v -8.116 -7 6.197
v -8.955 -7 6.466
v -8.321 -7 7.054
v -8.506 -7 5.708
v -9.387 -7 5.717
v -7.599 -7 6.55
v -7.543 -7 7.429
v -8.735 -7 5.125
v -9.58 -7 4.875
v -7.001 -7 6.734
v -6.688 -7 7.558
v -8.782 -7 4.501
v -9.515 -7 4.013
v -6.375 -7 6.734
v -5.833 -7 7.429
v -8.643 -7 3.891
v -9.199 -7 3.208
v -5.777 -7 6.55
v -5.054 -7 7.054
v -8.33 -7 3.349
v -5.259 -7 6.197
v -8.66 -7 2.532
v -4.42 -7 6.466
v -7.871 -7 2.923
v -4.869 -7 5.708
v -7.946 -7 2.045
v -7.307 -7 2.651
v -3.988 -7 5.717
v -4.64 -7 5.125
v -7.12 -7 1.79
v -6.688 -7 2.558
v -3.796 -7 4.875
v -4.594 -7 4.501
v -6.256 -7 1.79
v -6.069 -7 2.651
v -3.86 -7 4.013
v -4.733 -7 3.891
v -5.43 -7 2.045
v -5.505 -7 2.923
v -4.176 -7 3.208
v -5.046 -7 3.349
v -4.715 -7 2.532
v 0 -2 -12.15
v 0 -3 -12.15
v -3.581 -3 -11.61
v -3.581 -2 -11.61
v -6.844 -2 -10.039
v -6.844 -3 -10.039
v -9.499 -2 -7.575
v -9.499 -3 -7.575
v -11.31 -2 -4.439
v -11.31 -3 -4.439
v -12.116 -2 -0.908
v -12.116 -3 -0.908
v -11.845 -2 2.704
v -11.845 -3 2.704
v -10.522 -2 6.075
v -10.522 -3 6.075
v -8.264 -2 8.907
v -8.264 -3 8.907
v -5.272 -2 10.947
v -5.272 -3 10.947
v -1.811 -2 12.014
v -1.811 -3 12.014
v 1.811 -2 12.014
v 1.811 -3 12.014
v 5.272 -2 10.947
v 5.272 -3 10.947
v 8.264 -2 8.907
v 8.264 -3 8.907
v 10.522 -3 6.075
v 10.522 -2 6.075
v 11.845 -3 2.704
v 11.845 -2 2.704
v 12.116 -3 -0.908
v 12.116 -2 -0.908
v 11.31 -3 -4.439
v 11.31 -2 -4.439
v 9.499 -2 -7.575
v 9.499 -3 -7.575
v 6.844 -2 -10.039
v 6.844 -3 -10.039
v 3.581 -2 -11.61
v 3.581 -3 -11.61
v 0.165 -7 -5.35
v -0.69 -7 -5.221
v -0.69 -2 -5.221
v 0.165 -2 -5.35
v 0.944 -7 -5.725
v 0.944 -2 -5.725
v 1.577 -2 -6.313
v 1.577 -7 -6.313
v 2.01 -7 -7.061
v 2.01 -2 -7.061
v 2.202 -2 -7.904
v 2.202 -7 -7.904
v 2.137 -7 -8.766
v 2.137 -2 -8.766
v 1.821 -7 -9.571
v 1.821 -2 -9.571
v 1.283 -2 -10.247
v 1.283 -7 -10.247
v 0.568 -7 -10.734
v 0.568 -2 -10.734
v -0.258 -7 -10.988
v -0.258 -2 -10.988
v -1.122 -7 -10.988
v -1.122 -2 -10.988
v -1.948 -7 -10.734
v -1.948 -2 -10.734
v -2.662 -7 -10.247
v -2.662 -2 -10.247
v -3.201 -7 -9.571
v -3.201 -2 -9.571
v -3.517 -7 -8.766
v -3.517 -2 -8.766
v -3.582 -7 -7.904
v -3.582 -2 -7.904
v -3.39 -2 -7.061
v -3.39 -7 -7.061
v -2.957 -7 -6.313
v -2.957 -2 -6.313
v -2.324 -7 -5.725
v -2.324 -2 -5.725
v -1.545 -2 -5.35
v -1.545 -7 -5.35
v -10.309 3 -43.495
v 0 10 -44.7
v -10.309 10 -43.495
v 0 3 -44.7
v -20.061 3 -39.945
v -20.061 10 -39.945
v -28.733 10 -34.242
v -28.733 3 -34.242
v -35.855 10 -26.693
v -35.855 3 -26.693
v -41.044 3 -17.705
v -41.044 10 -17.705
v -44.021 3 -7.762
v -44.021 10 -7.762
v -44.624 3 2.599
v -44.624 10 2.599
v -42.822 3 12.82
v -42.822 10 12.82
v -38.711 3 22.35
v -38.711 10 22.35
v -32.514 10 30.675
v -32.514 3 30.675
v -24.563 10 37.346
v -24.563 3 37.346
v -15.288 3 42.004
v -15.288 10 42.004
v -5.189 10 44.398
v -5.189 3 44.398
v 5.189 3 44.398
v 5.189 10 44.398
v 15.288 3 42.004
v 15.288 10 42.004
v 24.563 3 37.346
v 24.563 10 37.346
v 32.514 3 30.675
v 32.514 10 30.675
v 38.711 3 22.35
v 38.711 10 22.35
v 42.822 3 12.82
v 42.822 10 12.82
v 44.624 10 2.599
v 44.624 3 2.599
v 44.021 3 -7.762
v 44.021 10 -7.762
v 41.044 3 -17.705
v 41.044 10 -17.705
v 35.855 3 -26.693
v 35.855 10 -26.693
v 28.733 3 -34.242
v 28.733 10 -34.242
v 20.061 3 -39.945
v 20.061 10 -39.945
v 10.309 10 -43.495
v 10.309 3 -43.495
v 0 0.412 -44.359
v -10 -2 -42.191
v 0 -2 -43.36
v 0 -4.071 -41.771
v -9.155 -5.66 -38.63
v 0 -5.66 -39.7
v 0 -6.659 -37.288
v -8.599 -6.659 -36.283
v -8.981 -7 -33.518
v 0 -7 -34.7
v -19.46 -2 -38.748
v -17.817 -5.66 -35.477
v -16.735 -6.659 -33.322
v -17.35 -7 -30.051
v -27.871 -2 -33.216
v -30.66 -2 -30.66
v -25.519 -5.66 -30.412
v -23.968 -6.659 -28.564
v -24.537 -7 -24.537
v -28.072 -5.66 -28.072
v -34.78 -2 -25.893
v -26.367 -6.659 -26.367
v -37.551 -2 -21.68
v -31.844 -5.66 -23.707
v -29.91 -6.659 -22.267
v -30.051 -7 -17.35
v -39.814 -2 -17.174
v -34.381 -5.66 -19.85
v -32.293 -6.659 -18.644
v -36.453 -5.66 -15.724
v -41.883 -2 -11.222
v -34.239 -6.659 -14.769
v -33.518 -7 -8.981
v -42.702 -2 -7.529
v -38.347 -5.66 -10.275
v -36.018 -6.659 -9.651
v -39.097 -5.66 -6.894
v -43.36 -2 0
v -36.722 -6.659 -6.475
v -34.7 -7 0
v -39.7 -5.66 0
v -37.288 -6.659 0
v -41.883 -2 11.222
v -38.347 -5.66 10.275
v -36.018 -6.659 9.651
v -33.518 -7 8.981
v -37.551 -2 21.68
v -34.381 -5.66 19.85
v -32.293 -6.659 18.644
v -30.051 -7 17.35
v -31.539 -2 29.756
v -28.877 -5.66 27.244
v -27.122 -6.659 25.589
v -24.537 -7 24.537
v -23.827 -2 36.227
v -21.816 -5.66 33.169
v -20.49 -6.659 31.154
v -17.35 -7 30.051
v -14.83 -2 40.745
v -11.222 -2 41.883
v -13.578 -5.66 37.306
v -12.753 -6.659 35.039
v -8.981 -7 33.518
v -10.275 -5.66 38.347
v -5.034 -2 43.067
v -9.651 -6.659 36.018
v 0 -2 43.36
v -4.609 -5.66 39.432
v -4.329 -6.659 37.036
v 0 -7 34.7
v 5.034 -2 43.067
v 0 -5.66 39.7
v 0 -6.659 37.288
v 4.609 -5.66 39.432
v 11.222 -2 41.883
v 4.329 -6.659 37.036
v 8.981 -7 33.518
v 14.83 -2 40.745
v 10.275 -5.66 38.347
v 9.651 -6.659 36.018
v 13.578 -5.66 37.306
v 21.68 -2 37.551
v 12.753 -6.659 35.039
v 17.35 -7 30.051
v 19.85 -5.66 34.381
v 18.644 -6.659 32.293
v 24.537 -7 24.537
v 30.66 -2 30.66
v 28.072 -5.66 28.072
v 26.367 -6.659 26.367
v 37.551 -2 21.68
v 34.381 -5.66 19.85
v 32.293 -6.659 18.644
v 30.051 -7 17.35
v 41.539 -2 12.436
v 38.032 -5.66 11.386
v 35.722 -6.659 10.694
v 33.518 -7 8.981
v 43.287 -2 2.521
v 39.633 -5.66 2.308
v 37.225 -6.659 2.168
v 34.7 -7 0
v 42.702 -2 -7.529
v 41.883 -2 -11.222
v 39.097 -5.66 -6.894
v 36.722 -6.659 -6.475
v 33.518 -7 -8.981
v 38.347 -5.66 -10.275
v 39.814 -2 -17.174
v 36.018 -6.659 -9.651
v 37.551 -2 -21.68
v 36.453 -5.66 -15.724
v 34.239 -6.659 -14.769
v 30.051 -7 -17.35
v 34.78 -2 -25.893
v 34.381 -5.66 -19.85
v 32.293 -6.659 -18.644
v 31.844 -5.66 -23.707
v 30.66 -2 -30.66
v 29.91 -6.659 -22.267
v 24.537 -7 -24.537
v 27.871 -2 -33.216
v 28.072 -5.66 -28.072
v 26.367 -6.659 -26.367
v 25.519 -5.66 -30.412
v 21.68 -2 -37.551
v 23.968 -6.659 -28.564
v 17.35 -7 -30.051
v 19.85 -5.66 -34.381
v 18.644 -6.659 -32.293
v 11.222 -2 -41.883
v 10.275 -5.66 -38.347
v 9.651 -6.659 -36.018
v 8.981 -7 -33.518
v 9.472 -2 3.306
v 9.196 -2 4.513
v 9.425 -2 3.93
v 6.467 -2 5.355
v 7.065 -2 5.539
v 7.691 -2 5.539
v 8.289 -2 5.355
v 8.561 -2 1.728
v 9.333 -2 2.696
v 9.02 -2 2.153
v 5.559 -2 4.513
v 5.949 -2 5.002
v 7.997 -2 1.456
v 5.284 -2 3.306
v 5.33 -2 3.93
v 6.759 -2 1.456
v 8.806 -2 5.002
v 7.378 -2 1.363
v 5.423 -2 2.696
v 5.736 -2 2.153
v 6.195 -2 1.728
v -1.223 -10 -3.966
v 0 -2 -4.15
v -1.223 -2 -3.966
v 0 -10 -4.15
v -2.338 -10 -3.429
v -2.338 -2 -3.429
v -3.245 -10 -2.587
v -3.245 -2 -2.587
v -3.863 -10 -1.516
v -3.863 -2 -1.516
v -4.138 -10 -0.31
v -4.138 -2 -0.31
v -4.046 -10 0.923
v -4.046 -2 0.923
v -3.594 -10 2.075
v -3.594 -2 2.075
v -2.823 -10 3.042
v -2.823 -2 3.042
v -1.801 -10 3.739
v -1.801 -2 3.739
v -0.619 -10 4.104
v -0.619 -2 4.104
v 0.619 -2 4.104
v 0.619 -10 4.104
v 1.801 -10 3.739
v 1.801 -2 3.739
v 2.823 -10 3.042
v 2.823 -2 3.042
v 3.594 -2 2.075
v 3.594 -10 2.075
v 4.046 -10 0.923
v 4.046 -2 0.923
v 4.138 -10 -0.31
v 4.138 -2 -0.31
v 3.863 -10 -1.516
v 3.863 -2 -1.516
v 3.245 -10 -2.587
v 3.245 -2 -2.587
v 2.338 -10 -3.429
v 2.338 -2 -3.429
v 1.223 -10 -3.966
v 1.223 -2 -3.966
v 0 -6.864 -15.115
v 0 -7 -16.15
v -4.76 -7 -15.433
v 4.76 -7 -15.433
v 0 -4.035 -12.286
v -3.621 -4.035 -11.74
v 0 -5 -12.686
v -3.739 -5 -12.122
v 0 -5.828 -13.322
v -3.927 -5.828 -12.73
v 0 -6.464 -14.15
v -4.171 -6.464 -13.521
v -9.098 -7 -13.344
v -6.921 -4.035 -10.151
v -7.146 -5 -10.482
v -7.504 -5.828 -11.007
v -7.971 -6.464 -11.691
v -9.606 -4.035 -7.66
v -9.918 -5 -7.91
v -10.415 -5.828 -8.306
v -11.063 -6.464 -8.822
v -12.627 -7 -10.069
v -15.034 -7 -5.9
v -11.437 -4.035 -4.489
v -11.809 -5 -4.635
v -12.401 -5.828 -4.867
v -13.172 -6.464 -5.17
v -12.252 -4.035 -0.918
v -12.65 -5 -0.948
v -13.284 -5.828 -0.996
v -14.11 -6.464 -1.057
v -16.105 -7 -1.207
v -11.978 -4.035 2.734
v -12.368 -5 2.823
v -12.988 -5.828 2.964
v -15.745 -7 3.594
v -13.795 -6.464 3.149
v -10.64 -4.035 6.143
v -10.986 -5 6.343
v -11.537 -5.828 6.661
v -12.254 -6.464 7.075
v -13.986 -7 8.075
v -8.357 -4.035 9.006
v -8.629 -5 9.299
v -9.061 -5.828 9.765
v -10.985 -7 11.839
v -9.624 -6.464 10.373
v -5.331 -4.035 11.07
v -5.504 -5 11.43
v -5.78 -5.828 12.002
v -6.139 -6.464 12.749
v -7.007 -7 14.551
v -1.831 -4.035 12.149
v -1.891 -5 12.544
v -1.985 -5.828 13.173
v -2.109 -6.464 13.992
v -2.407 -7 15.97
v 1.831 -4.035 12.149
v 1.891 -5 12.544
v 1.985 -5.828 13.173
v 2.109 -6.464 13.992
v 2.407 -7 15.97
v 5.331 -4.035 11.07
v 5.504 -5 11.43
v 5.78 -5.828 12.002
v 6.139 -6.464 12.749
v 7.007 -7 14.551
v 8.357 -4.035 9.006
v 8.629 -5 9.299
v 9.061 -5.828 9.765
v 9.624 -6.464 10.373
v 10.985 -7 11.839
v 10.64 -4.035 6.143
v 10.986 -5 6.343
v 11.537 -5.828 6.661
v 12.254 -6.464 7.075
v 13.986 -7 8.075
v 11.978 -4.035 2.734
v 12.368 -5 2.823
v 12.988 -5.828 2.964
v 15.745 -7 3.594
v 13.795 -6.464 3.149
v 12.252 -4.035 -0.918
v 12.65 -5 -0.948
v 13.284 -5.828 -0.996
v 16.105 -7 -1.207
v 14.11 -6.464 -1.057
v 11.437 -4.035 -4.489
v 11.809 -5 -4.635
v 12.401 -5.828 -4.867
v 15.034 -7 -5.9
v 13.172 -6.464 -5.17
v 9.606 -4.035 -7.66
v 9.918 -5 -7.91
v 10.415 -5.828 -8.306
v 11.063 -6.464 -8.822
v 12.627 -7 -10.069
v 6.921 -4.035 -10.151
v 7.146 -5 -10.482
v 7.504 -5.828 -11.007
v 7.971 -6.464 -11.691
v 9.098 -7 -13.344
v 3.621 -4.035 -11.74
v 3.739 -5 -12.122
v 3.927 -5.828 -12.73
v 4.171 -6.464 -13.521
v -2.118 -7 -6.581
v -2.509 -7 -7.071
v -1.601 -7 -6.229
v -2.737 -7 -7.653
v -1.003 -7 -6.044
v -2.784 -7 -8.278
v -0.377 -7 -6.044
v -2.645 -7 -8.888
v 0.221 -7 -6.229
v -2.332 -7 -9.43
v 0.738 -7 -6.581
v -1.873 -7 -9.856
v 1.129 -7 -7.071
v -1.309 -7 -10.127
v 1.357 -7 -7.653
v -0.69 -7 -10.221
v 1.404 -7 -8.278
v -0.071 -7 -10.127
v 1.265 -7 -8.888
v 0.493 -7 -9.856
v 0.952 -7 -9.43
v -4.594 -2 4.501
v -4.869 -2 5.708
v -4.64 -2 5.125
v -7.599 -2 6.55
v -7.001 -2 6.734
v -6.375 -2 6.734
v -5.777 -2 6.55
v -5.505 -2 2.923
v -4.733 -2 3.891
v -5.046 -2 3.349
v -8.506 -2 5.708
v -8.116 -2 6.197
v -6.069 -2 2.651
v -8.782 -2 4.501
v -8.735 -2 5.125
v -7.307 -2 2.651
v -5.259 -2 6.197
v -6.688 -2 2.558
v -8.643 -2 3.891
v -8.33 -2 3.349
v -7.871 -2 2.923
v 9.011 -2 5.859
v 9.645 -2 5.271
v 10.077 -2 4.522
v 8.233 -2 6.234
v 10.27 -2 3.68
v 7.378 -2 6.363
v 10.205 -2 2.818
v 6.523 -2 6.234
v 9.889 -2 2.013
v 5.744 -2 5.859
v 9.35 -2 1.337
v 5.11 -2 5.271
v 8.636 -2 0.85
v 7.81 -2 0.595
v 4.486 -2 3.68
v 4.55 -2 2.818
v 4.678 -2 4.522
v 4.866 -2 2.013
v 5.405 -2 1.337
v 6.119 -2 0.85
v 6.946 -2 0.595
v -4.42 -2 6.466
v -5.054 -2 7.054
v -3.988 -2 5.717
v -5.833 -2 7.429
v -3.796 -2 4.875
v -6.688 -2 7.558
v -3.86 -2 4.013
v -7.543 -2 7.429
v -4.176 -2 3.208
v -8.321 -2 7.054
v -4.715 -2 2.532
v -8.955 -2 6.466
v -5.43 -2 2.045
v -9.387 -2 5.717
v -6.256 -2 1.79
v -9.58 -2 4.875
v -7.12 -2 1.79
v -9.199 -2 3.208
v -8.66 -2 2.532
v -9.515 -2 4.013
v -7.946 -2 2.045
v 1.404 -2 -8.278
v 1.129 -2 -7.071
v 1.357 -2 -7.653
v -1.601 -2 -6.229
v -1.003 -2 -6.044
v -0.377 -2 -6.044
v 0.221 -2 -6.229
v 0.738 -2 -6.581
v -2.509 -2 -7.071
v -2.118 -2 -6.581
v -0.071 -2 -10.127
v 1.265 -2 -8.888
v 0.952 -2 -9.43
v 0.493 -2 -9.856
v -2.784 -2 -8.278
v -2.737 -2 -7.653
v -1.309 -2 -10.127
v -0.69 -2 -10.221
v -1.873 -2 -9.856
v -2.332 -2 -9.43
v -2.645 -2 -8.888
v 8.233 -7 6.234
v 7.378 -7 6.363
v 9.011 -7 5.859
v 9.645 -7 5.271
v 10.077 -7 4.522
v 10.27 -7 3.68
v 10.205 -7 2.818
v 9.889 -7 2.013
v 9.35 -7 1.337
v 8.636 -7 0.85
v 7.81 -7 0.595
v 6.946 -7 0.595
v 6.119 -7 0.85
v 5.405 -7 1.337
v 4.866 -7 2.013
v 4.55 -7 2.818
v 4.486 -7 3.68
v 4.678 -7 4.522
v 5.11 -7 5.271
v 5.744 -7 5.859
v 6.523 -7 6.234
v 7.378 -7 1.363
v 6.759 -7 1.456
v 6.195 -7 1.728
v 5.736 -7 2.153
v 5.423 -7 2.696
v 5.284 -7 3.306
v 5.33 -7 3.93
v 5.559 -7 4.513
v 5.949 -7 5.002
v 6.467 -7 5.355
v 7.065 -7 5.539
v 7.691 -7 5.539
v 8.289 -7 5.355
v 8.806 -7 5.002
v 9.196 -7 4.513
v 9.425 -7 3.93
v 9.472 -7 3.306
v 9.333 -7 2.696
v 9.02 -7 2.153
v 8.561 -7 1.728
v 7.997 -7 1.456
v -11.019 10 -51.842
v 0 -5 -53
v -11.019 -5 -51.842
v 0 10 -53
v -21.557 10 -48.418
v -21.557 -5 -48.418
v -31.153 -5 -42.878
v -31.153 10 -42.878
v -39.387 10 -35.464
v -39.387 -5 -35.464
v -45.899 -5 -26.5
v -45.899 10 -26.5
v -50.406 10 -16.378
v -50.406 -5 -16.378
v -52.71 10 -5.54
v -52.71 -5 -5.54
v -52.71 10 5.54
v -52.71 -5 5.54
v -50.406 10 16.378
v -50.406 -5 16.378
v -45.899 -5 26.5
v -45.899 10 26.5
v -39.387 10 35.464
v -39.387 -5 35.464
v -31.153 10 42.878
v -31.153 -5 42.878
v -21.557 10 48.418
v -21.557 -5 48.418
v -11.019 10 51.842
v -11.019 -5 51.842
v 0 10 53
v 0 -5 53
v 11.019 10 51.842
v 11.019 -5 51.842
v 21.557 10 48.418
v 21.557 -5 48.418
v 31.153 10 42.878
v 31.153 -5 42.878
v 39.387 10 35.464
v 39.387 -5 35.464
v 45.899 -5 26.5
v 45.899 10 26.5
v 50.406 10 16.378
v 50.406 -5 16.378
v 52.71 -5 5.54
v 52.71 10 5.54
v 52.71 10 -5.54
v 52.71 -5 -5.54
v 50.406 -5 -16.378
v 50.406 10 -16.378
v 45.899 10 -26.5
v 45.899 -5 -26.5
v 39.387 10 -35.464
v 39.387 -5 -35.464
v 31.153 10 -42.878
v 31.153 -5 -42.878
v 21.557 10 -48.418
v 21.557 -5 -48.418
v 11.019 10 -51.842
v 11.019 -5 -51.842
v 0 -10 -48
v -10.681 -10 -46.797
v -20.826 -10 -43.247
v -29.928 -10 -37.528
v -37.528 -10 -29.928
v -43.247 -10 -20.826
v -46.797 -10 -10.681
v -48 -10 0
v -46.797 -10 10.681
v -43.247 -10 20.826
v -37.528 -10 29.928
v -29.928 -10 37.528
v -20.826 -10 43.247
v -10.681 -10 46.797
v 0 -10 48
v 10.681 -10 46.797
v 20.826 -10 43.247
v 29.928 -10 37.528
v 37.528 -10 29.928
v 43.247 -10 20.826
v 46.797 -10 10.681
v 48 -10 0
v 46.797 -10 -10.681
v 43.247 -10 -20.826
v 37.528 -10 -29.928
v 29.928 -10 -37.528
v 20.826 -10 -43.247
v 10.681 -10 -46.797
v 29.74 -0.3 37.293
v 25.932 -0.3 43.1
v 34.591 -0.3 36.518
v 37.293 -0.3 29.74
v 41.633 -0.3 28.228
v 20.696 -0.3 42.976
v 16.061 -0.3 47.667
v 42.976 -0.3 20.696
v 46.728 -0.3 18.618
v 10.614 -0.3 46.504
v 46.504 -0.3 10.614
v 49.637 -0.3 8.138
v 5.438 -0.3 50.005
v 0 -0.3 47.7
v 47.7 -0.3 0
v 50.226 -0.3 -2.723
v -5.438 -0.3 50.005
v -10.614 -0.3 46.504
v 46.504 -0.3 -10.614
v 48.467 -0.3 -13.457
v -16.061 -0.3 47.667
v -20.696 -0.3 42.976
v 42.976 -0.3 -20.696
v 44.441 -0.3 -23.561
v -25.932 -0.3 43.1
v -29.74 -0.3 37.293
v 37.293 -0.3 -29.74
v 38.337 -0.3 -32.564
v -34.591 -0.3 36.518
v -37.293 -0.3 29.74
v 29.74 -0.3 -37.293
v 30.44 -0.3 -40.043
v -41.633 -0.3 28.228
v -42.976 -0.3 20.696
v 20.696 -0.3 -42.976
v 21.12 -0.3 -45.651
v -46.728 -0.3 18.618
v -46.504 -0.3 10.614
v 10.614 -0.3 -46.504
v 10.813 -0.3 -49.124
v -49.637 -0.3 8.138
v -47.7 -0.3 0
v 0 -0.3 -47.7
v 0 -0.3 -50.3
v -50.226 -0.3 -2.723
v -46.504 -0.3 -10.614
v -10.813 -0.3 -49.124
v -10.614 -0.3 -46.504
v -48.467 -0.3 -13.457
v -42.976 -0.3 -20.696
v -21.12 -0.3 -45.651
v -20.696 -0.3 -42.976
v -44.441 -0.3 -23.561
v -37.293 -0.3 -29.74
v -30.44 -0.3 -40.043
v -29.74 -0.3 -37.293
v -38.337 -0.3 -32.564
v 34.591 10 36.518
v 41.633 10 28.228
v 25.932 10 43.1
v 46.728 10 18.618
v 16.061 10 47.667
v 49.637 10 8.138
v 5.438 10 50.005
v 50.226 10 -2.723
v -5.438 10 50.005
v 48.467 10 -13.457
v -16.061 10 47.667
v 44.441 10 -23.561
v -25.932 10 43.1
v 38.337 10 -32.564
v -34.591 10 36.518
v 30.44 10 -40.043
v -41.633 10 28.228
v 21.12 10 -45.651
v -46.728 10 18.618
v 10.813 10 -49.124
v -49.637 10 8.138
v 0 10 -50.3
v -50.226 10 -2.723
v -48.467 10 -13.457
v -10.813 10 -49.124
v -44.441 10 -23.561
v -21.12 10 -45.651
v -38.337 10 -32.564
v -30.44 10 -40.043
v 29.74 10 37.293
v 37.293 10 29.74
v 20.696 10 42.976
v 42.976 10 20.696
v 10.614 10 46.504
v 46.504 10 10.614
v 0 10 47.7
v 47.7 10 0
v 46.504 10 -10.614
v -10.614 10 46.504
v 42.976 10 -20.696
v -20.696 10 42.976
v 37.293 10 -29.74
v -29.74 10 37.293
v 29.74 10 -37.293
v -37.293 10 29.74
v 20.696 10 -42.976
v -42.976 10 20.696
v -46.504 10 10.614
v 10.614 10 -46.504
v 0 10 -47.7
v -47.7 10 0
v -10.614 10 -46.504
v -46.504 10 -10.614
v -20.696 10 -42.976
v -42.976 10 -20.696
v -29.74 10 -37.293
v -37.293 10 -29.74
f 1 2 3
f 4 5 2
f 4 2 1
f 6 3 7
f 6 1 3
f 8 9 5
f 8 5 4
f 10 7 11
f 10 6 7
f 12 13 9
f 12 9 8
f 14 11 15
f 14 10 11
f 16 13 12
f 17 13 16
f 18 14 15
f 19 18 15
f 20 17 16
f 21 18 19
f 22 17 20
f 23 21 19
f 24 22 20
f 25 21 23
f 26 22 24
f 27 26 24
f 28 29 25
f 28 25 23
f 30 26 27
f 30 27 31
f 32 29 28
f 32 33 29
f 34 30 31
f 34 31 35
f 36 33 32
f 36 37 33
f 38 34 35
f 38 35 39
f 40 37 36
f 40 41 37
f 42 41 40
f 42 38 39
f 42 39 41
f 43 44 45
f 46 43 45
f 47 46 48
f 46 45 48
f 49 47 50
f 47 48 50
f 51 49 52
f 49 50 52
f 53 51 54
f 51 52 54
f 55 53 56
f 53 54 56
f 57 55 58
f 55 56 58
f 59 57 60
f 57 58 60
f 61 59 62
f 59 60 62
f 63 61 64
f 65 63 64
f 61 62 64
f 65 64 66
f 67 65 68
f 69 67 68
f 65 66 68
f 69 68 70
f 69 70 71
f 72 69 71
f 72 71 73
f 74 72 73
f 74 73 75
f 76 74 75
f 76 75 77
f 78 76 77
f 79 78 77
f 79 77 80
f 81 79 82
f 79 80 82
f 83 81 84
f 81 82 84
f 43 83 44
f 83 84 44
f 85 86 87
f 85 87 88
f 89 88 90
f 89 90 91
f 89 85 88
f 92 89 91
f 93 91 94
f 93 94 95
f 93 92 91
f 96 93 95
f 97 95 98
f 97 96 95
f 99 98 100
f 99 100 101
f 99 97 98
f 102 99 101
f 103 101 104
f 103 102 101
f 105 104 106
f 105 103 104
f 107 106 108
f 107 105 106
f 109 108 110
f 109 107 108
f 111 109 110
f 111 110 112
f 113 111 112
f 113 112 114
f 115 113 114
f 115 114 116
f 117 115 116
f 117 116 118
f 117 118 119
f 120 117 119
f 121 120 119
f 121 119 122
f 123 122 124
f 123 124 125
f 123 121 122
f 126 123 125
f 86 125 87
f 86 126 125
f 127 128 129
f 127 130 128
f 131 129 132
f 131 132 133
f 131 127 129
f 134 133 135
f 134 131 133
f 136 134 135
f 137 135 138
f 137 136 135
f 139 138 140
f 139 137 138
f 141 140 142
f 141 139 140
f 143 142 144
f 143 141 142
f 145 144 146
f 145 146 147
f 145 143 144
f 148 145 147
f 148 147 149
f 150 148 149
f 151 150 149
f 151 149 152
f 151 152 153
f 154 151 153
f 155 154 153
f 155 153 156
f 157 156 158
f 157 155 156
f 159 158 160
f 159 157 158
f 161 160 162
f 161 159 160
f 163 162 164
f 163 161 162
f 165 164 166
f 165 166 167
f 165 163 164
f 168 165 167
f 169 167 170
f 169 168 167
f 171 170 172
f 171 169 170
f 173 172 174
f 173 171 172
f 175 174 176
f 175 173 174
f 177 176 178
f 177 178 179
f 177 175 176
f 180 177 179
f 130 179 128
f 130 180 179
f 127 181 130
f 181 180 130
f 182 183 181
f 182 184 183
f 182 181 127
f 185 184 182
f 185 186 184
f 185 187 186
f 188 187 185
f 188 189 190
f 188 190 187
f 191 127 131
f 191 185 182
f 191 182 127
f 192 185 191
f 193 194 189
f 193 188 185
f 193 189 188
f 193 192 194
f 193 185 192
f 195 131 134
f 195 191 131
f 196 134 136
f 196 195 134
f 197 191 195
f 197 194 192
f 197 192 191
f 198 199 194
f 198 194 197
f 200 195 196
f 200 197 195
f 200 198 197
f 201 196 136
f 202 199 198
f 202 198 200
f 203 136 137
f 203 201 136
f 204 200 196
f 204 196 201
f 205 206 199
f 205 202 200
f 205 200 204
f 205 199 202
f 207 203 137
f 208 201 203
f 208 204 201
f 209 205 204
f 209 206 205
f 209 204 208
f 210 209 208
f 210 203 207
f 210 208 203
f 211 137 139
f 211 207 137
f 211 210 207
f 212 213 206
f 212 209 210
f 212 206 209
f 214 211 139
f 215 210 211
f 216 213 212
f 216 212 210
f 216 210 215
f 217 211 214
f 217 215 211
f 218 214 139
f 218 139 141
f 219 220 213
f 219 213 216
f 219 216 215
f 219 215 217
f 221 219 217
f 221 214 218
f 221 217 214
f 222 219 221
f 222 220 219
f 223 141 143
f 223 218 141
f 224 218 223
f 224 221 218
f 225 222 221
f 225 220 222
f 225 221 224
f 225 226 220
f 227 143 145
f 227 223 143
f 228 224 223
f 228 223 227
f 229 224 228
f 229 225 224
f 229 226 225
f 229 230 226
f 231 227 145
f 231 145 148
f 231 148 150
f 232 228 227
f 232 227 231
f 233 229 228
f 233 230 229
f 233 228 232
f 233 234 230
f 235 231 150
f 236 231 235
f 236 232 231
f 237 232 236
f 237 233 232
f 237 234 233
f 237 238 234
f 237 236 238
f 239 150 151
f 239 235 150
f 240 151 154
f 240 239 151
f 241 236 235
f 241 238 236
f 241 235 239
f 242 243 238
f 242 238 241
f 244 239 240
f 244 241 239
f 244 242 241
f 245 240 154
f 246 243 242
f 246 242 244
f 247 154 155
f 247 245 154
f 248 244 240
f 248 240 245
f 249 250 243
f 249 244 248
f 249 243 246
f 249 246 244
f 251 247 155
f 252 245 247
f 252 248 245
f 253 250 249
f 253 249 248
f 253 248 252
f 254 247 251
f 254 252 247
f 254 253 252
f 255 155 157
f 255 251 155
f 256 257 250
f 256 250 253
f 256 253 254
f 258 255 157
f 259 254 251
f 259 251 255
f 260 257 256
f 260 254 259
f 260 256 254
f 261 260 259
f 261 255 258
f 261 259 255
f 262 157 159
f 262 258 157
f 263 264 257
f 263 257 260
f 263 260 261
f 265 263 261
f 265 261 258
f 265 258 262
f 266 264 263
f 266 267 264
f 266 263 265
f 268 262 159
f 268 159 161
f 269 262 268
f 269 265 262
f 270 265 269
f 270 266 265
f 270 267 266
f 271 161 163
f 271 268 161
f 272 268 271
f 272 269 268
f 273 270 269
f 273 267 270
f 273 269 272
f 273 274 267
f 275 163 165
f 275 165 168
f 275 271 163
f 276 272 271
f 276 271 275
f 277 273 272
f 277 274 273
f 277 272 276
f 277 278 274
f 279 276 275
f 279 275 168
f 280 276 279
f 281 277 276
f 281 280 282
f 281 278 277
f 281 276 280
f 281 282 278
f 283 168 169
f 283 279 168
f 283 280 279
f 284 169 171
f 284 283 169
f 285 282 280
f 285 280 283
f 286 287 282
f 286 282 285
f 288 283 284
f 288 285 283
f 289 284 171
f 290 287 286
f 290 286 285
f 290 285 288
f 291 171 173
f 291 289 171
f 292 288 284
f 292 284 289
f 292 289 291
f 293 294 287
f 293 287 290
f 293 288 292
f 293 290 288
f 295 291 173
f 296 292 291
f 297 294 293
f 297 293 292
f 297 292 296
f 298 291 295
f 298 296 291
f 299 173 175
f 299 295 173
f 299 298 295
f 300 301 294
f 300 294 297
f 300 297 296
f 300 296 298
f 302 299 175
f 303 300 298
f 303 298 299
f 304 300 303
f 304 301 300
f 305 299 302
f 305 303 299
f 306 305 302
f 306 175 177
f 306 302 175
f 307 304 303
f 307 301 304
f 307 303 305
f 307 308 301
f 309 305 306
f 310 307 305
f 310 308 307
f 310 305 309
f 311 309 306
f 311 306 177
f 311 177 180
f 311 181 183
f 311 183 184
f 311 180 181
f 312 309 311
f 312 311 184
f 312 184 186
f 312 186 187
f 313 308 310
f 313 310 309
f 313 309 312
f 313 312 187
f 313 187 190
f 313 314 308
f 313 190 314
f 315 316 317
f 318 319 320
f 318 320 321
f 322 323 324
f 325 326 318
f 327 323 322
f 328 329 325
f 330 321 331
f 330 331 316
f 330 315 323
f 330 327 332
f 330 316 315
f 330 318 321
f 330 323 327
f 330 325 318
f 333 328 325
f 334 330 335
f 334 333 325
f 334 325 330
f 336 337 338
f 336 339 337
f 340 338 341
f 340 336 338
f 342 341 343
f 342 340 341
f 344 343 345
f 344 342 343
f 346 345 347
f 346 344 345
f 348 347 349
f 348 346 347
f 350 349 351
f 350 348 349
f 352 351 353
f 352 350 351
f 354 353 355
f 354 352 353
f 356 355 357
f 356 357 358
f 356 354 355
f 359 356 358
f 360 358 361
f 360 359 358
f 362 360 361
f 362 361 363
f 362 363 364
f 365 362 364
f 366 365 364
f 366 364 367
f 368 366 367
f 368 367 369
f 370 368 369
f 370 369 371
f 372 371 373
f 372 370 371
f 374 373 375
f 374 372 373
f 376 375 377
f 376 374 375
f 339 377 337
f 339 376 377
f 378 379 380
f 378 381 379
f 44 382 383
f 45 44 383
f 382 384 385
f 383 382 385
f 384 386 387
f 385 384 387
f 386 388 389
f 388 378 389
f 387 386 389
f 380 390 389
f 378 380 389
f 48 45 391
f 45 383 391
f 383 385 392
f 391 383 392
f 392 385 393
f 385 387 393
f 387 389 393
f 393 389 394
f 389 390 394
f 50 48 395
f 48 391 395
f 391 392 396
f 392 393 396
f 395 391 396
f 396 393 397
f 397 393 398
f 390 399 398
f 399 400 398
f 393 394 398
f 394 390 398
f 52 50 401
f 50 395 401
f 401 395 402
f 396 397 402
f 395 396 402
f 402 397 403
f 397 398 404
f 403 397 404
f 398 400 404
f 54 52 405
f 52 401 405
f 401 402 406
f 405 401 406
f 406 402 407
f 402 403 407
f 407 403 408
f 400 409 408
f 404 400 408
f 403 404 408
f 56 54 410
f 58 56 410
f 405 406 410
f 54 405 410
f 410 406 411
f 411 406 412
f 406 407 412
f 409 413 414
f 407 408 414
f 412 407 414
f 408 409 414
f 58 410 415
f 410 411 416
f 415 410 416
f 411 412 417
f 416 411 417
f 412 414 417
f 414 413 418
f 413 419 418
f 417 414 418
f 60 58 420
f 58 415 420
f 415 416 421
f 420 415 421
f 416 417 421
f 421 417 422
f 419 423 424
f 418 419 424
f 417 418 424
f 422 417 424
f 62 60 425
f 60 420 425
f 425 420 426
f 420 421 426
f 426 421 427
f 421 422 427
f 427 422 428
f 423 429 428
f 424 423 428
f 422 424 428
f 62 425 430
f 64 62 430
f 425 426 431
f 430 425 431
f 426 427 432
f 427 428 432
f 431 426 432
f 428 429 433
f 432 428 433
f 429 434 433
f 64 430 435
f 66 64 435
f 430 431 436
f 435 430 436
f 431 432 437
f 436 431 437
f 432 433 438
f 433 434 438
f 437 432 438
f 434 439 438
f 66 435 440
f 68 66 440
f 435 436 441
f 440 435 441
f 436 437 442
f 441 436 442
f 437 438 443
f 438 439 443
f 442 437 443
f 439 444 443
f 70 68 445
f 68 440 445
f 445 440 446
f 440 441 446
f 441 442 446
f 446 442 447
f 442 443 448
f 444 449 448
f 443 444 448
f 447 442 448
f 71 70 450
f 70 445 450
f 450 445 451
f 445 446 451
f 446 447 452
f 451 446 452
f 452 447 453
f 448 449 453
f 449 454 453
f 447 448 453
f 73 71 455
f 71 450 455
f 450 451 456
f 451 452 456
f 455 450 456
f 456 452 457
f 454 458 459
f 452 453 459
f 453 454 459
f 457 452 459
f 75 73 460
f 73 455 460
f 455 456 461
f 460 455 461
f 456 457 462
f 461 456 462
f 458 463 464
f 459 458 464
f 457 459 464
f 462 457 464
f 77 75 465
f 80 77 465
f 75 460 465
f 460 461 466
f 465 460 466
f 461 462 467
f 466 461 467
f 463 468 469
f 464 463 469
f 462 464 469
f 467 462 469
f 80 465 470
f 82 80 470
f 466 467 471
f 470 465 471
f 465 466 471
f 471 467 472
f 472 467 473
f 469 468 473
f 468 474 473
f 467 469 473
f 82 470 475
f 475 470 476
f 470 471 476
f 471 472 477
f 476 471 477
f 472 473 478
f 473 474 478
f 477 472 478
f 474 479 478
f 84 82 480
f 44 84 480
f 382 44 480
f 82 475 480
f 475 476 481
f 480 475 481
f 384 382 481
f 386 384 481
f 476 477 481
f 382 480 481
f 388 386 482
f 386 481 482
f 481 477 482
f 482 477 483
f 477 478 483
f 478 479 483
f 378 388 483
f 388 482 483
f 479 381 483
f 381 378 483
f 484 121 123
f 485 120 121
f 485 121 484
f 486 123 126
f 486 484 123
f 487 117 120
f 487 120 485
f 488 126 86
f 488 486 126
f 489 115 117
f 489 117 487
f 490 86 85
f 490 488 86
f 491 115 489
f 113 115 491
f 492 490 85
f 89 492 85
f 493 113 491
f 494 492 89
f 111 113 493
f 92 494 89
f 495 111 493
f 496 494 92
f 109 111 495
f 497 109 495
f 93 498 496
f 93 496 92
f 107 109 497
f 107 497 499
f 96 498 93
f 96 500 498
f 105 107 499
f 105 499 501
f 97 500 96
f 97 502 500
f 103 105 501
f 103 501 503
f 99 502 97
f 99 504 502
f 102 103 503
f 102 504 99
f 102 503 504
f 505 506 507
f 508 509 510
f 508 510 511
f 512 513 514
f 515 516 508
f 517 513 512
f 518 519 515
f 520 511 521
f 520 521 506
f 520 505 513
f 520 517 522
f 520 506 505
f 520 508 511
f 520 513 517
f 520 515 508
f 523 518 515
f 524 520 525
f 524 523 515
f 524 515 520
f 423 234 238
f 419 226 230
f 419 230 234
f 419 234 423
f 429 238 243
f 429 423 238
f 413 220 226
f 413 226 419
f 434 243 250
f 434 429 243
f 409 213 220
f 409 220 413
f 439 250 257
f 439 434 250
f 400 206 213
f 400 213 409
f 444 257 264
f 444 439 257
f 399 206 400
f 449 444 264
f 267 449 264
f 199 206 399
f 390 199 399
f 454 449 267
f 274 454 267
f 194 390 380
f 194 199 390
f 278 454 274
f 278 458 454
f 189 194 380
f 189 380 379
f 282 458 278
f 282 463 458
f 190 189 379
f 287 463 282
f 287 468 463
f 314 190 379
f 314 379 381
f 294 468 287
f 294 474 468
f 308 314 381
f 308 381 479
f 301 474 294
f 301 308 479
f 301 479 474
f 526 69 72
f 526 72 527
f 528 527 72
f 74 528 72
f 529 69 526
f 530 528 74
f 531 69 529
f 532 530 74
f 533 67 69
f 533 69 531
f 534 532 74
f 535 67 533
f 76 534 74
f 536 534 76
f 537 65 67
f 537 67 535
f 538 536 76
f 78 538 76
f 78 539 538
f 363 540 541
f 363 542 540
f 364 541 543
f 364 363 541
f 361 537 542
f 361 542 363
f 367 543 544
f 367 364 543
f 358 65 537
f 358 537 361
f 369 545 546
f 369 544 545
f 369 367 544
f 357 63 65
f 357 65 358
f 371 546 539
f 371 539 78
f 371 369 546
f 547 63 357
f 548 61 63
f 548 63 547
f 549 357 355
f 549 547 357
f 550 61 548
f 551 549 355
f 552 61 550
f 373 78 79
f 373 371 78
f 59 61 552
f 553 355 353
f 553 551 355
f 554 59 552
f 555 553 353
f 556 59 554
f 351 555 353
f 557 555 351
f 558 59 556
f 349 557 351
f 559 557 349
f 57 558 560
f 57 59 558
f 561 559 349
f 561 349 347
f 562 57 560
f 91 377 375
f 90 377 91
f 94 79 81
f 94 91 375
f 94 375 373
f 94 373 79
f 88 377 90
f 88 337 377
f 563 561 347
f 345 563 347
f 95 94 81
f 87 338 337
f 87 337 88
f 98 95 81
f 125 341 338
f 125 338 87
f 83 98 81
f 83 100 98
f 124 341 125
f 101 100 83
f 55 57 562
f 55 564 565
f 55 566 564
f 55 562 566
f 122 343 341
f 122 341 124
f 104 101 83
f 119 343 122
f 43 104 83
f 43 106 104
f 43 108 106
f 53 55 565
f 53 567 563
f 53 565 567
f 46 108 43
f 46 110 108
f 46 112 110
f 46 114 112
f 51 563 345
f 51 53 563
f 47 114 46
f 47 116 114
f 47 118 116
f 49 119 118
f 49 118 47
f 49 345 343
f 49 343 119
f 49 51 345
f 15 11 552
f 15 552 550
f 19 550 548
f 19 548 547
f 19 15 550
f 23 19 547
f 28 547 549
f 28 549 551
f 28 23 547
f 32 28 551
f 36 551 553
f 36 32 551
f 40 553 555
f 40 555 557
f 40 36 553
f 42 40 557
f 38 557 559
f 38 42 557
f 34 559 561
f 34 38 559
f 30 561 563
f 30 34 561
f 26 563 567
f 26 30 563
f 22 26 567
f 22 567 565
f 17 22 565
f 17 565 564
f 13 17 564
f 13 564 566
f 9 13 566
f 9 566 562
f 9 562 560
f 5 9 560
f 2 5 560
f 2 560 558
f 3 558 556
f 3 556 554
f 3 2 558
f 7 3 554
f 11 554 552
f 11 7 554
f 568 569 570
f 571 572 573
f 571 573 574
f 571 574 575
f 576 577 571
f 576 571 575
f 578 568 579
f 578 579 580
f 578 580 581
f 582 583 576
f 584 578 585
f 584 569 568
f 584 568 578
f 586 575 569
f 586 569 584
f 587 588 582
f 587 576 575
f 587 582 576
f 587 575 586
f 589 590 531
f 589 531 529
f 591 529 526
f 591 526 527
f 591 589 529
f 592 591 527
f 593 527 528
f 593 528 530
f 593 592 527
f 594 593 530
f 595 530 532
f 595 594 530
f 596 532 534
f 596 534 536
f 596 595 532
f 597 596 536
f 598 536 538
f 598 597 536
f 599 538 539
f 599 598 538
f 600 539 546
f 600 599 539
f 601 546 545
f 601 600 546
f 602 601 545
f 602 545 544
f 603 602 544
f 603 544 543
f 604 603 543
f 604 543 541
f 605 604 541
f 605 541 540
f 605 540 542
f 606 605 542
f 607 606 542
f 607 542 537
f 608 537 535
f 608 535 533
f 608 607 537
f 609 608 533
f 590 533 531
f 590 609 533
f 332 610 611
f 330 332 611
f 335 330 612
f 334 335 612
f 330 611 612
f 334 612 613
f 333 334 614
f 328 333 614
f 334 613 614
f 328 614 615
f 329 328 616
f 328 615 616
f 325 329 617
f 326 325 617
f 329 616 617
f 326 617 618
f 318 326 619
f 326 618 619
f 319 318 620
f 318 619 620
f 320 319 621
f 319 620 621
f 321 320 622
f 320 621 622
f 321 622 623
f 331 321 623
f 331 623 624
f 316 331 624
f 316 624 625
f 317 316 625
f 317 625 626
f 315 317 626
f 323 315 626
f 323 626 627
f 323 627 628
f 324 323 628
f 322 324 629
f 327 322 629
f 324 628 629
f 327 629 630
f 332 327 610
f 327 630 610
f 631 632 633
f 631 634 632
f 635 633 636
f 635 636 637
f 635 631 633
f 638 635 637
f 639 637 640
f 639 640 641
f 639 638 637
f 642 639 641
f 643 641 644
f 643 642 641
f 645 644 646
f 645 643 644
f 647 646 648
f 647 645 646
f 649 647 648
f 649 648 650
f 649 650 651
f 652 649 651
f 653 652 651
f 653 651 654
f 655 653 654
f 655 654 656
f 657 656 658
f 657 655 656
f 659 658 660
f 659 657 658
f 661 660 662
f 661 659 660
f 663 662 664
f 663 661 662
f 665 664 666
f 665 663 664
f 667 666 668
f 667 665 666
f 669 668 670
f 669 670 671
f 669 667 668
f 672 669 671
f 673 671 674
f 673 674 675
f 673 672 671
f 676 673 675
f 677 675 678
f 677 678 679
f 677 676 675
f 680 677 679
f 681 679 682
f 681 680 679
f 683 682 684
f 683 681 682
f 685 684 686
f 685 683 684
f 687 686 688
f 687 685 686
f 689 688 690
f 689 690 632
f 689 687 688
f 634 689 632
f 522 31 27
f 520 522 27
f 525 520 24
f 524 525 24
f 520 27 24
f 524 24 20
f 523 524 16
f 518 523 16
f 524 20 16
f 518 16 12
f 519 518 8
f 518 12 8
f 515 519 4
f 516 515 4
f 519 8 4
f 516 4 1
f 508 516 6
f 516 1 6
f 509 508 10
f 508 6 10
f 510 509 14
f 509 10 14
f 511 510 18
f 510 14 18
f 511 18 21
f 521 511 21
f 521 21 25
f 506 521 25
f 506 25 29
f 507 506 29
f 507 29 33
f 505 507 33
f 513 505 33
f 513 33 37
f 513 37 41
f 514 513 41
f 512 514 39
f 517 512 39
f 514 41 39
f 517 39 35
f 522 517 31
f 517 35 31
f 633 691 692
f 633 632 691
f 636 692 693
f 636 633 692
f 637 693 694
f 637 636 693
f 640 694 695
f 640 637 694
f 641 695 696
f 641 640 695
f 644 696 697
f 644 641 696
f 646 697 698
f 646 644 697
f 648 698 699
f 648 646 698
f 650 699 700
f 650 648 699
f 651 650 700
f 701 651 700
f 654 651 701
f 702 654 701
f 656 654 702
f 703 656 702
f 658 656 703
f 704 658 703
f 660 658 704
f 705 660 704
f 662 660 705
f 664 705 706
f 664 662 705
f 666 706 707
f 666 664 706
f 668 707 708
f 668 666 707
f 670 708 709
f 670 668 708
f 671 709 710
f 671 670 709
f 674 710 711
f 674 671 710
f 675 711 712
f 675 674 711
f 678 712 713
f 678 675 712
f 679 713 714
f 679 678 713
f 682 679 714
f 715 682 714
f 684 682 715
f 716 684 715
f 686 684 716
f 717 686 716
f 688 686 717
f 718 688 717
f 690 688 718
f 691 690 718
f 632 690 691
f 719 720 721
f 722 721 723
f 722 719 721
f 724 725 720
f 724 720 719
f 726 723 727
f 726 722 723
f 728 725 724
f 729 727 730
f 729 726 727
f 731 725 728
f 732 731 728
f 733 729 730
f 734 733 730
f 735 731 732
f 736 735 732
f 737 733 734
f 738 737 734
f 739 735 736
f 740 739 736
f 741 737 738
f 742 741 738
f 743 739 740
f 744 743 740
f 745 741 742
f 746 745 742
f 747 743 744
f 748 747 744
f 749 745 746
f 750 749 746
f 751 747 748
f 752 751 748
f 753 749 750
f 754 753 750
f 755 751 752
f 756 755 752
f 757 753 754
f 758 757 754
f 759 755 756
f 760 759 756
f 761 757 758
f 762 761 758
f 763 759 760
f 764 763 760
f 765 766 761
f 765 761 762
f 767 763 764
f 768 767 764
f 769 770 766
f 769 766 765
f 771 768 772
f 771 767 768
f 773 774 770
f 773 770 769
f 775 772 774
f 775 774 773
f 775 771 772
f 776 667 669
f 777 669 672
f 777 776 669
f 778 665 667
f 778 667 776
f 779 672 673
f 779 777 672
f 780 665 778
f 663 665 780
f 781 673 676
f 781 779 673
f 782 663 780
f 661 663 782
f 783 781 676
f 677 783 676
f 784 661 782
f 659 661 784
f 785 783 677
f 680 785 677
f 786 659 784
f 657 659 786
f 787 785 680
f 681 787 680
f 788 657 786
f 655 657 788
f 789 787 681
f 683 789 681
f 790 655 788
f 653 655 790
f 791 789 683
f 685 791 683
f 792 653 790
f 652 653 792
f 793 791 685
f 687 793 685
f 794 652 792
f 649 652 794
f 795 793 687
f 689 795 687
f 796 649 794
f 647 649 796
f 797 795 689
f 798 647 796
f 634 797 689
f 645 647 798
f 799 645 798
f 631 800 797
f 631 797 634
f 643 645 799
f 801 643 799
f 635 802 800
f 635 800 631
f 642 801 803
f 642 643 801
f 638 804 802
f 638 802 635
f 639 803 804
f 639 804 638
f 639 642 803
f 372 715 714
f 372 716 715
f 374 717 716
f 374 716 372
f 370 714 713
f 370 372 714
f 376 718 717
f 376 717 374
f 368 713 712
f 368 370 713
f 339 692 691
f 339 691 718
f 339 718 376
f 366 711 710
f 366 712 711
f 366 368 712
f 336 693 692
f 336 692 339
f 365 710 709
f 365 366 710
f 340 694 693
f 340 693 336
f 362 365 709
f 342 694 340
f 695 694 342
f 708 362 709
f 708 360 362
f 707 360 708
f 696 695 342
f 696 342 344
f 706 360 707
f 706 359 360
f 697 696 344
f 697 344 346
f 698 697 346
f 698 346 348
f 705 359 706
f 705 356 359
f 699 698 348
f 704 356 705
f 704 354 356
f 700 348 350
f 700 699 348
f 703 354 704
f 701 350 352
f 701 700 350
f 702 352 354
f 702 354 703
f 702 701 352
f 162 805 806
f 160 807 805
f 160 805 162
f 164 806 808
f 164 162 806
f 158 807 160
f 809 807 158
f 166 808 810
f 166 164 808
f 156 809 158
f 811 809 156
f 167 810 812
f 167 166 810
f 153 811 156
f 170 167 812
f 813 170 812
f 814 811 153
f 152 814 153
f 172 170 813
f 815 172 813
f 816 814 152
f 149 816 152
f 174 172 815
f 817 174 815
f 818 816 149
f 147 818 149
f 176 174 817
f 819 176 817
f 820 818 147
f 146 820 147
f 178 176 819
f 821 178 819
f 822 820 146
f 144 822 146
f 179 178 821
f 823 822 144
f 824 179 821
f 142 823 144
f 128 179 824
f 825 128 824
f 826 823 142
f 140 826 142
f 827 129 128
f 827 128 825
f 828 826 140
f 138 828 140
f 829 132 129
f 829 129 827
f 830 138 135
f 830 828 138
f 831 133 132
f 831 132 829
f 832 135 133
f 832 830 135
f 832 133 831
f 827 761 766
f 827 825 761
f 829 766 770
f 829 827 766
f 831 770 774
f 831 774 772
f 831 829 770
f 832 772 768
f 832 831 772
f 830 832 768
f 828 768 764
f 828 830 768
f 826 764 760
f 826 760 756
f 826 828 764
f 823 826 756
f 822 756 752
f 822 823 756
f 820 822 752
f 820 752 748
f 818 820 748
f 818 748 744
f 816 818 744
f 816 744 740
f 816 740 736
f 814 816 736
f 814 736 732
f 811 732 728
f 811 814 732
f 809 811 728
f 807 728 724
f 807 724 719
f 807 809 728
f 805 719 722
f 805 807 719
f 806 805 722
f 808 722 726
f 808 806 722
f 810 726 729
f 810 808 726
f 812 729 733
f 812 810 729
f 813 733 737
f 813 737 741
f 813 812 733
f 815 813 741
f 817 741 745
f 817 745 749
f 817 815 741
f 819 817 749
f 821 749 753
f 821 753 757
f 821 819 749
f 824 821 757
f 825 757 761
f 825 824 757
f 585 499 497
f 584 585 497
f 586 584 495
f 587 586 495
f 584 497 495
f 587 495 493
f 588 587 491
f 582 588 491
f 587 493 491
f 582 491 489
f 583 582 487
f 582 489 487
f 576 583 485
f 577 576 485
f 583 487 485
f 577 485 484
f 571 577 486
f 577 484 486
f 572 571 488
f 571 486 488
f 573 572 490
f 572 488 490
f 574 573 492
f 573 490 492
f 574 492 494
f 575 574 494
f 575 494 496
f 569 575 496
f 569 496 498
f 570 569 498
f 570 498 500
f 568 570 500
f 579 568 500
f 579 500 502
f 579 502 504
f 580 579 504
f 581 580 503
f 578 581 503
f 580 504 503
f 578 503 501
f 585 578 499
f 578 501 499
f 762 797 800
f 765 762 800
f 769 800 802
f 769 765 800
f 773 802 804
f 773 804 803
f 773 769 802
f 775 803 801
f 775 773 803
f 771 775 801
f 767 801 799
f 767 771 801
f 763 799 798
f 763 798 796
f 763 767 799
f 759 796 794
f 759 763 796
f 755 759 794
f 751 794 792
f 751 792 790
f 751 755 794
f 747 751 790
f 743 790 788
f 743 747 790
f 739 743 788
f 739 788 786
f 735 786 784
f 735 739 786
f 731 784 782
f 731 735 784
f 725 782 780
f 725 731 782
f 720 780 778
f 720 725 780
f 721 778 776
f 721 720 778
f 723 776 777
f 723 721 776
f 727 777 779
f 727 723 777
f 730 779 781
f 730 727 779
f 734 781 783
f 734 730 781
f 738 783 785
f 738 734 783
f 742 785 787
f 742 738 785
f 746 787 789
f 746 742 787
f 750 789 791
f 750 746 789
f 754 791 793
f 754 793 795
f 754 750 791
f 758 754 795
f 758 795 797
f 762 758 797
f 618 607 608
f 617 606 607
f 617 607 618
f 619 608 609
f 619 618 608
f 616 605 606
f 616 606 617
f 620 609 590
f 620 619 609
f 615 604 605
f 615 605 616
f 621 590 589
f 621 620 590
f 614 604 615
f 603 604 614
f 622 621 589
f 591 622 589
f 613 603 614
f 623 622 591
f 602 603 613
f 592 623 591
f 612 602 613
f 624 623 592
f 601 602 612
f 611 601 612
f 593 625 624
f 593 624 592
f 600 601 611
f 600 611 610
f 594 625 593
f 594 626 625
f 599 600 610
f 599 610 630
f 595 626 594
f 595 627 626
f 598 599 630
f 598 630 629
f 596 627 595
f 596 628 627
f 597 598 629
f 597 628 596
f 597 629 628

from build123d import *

# Parameters (mm, degrees)
SKETCH3_R           = 23.00375504
CUT_EXTRUDE3_DEPTH  = 14.574115143
SKETCH4_R           = 12.15
SKETCH4_R_2         = 2.9
SKETCH4_R_3         = 4.15
SKETCH4_R_4         = 2.1
BOSS_EXTRUDE1_DEPTH = 5
FILLET1_R           = 4


with BuildPart() as part:
    # Sketch1 → Revolve1 (revolve)
    with BuildSketch(Plane.XY, mode=Mode.PRIVATE) as revolve1_sk:
        with BuildLine():
            Line((-50.3, 10), (-50.3, -0.3))
            Line((-50.3, -0.3), (-47.7, -0.3))
            Line((-47.7, -0.3), (-47.7, 10))
            Line((-47.7, 10), (-44.7, 10))
            Line((-44.7, 10), (-44.7, 3))
            ThreePointArc((-44.7, 3), (-41.771067812, -4.071067812), (-34.7, -7))
            Line((-34.7, -7), (-17.15, -7))
            ThreePointArc((-17.15, -7), (-10.078932188, -4.071067812), (-7.15, 3))
            Line((-7.15, 3), (-7.15, 7.574115143))
            Line((-7.15, 7.574115143), (-4.15, 7.574115143))
            Line((-4.15, 7.574115143), (-4.15, -10))
            Line((-4.15, -10), (-48, -10))
            Line((-48, -10), (-53, -5))
            Line((-53, -5), (-53, 10))
            Line((-53, 10), (-50.3, 10))
        make_face()
    revolve(revolve1_sk.sketch.rotate(Axis((0, 0, 0), (0, 1, 0)), 270), axis=Axis((0, 0, 0), (0, 1, 0)))

    # Sketch3 → Cut-Extrude3 (cut)
    with BuildSketch(Plane(origin=(0, 7.574115143, 0), x_dir=(1, 0, 0), z_dir=(0, 1, 0))):
        Circle(SKETCH3_R)
    extrude(amount=-CUT_EXTRUDE3_DEPTH, mode=Mode.SUBTRACT)

    # Sketch4 → Boss-Extrude1 (add)
    # profile 1 of 4: a face of its own
    with BuildSketch(Plane(origin=(0, -7, 0), x_dir=(1, 0, 0), z_dir=(0, 1, 0))):
        with Locations(Location((0, 0, 0), (0, 0, 90))):
            Circle(SKETCH4_R)
        with Locations(Location((7.377762048, -3.462820695, 0), (0, 0, 270))):
            Circle(SKETCH4_R_2, mode=Mode.SUBTRACT)
        with Locations(Location((-0.689990334, 8.120739704, 0), (0, 0, 270))):
            Circle(SKETCH4_R_2, mode=Mode.SUBTRACT)
        with Locations(Location((-6.687771714, -4.657919009, 0), (0, 0, 270))):
            Circle(SKETCH4_R_2, mode=Mode.SUBTRACT)
        with Locations(Location((0, 0, 0), (0, 0, 90))):
            Circle(SKETCH4_R_3, mode=Mode.SUBTRACT)
    # profile 2 of 4: a face of its own
    with BuildSketch(Plane(origin=(0, -7, 0), x_dir=(1, 0, 0), z_dir=(0, 1, 0))):
        with Locations(Location((-6.687771714, -4.657919009, 0), (0, 0, 90))):
            Circle(SKETCH4_R_4)
    # profile 3 of 4: a face of its own
    with BuildSketch(Plane(origin=(0, -7, 0), x_dir=(1, 0, 0), z_dir=(0, 1, 0))):
        with Locations(Location((7.377762048, -3.462820695, 0), (0, 0, 90))):
            Circle(SKETCH4_R_4)
    # profile 4 of 4: a face of its own
    with BuildSketch(Plane(origin=(0, -7, 0), x_dir=(1, 0, 0), z_dir=(0, 1, 0))):
        with Locations(Location((-0.689990334, 8.120739704, 0), (0, 0, 90))):
            Circle(SKETCH4_R_4)
    extrude(amount=BOSS_EXTRUDE1_DEPTH)

    # Fillet1
    fillet1_edges = [part.edges().sort_by_distance(p)[0] for p in [
        (0, -7, 12.15),
    ]]
    fillet(fillet1_edges, radius=FILLET1_R)


solid = part.part
